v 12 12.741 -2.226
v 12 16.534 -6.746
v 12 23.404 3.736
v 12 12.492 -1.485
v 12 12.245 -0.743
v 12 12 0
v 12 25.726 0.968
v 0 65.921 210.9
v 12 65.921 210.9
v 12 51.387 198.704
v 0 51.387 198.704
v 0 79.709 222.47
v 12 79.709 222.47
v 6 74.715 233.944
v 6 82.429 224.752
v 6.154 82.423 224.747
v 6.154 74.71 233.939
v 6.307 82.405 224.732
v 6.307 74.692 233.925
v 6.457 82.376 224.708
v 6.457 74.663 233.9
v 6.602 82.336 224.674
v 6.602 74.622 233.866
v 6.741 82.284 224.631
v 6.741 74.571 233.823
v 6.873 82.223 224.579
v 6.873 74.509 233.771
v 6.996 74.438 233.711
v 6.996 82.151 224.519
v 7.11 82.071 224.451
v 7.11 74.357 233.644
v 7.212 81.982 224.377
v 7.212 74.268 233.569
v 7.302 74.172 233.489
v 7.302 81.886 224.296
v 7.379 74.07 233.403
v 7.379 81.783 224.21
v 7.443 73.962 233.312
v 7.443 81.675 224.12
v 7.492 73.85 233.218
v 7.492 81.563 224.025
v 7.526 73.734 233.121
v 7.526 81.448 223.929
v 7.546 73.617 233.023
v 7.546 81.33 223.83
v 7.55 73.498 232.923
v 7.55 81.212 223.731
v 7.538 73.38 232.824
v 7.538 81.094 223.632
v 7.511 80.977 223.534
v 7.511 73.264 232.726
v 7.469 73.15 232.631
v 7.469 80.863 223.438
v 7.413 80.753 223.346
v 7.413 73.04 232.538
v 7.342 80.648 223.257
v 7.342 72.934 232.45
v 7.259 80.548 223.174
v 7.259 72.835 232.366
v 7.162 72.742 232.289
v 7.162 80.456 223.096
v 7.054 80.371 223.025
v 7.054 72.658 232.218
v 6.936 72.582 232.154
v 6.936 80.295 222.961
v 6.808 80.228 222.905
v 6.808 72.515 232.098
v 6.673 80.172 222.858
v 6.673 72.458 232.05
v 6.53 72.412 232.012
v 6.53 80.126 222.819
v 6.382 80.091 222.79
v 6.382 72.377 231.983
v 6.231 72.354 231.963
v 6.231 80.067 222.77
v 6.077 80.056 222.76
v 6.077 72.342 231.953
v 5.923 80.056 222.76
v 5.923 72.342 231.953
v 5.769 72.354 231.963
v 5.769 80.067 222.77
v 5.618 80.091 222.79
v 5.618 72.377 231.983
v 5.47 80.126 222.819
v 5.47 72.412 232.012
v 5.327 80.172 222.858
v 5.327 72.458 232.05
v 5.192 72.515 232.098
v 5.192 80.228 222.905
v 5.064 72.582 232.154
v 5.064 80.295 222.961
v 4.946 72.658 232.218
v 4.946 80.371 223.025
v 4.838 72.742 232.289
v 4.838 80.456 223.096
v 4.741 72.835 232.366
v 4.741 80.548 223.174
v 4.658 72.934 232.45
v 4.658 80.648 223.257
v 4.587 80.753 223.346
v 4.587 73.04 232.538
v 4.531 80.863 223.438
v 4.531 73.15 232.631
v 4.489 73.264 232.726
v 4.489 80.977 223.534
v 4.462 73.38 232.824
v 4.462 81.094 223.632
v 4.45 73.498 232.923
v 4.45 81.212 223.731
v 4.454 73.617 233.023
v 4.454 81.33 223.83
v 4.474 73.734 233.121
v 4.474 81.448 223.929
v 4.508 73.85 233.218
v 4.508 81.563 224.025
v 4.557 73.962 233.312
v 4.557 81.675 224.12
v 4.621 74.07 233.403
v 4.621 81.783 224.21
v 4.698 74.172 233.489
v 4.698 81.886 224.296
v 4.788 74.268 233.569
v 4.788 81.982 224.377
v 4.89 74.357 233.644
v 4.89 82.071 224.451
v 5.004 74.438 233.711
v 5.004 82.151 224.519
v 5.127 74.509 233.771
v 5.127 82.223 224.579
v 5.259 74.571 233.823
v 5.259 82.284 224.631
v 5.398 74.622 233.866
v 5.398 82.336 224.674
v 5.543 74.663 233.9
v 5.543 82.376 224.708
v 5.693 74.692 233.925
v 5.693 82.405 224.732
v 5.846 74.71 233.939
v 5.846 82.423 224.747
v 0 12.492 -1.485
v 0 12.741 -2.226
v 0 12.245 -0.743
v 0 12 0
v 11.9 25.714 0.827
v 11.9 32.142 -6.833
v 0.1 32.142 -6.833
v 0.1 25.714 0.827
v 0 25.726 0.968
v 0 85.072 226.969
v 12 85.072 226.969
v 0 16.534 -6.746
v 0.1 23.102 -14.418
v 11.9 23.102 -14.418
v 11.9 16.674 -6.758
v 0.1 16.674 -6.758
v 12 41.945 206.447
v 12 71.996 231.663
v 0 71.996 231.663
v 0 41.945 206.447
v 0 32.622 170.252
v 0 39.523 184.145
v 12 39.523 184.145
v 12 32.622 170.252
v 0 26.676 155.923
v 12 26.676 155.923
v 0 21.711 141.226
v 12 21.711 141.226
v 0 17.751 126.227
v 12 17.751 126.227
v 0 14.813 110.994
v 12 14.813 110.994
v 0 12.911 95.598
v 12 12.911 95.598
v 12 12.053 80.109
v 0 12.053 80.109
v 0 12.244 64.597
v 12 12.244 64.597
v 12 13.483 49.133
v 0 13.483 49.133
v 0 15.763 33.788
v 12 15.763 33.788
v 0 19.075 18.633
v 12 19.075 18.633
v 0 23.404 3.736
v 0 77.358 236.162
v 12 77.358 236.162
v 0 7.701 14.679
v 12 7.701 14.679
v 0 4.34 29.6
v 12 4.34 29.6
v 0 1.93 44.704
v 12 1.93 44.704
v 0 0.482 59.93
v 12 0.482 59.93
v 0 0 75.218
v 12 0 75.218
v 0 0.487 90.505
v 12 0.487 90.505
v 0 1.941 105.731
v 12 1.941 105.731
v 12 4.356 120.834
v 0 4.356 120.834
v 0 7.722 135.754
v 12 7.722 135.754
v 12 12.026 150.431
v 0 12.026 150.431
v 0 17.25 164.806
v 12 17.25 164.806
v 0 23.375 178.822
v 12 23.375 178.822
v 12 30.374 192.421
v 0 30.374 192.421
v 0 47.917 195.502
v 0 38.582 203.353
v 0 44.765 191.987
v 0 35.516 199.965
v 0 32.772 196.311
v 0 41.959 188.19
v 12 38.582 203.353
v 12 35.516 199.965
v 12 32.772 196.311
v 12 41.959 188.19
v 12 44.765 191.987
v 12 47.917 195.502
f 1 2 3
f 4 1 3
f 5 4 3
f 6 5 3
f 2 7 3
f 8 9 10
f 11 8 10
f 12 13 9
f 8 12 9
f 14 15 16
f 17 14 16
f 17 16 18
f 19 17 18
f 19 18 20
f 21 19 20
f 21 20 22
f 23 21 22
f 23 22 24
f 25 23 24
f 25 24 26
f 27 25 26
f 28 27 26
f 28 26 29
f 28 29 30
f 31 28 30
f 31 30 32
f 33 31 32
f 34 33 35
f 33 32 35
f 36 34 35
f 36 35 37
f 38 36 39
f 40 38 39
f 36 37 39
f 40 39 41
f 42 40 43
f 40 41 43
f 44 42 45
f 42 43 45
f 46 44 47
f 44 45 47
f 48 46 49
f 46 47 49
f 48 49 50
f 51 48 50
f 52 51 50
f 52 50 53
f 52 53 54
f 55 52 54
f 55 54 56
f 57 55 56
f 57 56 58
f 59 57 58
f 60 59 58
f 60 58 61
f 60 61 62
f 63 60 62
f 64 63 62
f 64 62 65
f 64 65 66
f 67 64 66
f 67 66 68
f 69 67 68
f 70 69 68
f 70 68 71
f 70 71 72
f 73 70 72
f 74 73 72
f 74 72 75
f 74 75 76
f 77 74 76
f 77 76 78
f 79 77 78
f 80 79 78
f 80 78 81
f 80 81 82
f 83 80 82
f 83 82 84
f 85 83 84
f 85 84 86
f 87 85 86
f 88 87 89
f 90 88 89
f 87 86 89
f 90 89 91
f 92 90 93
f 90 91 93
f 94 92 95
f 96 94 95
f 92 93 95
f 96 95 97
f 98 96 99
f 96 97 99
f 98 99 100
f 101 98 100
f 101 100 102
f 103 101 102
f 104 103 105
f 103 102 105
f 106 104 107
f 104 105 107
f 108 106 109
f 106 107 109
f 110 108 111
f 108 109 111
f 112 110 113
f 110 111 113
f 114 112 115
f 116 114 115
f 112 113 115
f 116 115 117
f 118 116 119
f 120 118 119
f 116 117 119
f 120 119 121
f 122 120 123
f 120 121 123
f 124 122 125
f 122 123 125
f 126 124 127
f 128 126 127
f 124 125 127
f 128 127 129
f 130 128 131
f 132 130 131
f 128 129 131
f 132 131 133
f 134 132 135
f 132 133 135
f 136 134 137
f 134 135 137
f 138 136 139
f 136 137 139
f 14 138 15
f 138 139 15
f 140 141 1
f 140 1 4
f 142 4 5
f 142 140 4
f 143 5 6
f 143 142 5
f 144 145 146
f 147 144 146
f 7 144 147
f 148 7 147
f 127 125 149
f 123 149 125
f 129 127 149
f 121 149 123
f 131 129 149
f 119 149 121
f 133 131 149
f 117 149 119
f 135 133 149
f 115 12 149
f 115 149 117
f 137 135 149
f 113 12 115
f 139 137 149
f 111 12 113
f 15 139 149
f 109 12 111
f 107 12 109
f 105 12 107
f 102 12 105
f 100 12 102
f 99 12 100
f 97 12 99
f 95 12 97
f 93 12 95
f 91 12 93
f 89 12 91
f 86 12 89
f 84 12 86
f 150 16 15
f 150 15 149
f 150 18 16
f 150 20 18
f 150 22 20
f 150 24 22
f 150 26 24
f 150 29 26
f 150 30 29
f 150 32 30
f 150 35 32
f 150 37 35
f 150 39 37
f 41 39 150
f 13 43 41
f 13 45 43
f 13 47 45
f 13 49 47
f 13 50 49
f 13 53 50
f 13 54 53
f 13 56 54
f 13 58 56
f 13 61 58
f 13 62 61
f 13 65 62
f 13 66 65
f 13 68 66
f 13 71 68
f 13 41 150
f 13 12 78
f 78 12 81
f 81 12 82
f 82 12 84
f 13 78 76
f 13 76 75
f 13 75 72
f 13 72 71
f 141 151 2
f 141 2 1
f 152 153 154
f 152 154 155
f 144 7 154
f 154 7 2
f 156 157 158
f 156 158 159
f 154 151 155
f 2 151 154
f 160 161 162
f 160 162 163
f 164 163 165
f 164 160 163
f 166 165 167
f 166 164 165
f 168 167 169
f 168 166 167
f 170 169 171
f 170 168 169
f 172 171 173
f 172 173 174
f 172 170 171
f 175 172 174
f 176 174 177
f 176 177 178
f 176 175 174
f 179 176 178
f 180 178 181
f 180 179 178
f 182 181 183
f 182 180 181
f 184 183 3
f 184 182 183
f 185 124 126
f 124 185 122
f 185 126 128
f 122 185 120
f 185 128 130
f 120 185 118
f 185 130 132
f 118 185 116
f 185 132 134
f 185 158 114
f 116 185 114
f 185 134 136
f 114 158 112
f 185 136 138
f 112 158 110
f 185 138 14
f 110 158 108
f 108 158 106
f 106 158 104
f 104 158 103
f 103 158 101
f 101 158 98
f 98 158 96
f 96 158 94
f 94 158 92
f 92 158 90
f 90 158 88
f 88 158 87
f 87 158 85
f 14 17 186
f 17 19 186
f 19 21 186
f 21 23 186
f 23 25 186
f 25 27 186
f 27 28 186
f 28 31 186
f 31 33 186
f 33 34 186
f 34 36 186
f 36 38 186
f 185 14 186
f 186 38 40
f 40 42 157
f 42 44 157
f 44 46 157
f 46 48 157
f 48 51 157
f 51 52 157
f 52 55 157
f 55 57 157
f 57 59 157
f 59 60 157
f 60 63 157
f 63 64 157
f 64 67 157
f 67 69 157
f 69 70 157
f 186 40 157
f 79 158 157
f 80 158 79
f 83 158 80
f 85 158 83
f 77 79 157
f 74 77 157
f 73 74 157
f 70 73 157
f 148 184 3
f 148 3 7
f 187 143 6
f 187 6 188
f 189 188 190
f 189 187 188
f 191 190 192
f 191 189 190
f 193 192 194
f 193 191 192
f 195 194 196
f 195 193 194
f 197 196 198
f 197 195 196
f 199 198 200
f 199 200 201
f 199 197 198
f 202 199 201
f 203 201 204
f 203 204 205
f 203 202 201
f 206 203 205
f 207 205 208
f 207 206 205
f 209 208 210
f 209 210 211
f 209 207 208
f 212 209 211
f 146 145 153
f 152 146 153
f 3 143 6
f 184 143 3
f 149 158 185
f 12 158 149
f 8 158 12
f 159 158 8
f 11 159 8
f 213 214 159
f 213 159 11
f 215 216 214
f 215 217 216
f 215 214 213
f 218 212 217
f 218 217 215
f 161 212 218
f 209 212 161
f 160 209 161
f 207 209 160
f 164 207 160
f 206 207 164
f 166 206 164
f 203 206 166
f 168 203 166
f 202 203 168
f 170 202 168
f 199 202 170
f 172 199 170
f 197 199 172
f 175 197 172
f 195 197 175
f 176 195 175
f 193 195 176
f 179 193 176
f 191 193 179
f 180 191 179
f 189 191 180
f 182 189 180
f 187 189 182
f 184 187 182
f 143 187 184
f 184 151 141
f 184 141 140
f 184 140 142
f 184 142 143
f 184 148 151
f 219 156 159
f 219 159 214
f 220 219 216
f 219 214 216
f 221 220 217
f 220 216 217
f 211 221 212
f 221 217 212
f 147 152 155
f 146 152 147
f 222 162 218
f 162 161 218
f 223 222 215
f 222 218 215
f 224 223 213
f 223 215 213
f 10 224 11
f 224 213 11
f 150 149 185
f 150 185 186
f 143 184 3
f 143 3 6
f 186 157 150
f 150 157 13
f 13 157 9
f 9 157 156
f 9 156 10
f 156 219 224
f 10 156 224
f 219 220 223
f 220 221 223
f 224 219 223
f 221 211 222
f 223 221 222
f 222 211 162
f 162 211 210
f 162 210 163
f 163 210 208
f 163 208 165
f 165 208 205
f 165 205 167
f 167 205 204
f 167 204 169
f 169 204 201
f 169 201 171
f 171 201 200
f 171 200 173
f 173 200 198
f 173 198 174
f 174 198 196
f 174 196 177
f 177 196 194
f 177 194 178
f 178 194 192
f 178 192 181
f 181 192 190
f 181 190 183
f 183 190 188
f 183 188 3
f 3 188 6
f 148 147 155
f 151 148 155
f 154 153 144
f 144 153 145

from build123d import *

# Parameters (mm, degrees)
AUFSATZ_LINEAR_AUSTRAGEN1_DEPTH = 12
AUFSATZ_LINEAR_AUSTRAGEN3_DEPTH = 12
AUFSATZ_LINEAR_AUSTRAGEN4_DEPTH = 12
SCHNITT_LINEAR_AUSTRAGEN1_DEPTH = 254.175024926
VERRUNDUNG1_R                   = 50
SKIZZE9_W                       = 12
SKIZZE9_H                       = 12
AUFSATZ_LINEAR_AUSTRAGEN6_DEPTH = 7
SKIZZE10_R                      = 9.036348878
SKIZZE10_W                      = 11.8
SKIZZE10_H                      = 11.8
SCHNITT_LINEAR_AUSTRAGEN3_DEPTH = 10
SKIZZE11_R                      = 1.55
SCHNITT_LINEAR_AUSTRAGEN4_DEPTH = 218.416419828
FASE1_SIZE                      = 0.1


with BuildPart() as part:
    # Skizze1 → Aufsatz-Linear austragen1 (new body)
    with BuildSketch(Plane(origin=(0, 0, 0), x_dir=(0, 0, -1), z_dir=(1, 0, 0))):
        with BuildLine():
            Line((-240, 65), (-230.735708163, 72.773663864))
            ThreePointArc((-230.735708163, 72.773663864), (-123.944567763, 17.242039243), (-3.735818811, 23.403668612))
            Line((-3.735818811, 23.403668612), (0, 12))
            ThreePointArc((0, 12), (-127.247502729, 5.681119716), (-240, 65))
        make_face()
    extrude(amount=AUFSATZ_LINEAR_AUSTRAGEN1_DEPTH)

    # Skizze5 → Aufsatz-Linear austragen4 (add)
    with BuildSketch(Plane(origin=(12, 0, 0), x_dir=(0, 0, -1), z_dir=(1, 0, 0))):
        Polygon((-231.662517154, 71.995978781), (-222.469983836, 79.709430098), (-210.899806862, 65.920630121), (-192.948331238, 44.526894555), (-220.092340179, 58.207178805), align=None)
    extrude(amount=-AUFSATZ_LINEAR_AUSTRAGEN4_DEPTH)

    # Skizze6 → Schnitt-Linear austragen1 (cut, through all)
    with BuildSketch(Plane(origin=(12, 0, 0), x_dir=(0, 0, -1), z_dir=(1, 0, 0))):
        Polygon((-231.662517154, 71.995978781), (-199.510648028, 33.678873242), (-204.367668784, 29.603348917), (-240, 65), align=None)
    extrude(amount=-SCHNITT_LINEAR_AUSTRAGEN1_DEPTH, mode=Mode.SUBTRACT)

    # Verrundung1
    verrundung1_edges = [part.edges().sort_by_distance(p)[0] for p in [
        (6, 44.526894555, 192.948331238),
        (6, 35.285406895, 200.858689823),
    ]]
    fillet(verrundung1_edges, radius=VERRUNDUNG1_R)

    # Skizze9 → Aufsatz-Linear austragen6 (add)
    with BuildSketch(Plane(origin=(0, 156.320496136, 131.168470653), x_dir=(1, 0, 0), z_dir=(0, 0.7660444431189836, 0.6427876096865328))):
        with Locations((6, -125.185660837)):
            Rectangle(SKIZZE9_W, SKIZZE9_H)
    extrude(amount=AUFSATZ_LINEAR_AUSTRAGEN6_DEPTH)

    # Skizze11 → Schnitt-Linear austragen4 (cut, through all)
    with BuildSketch(Plane(origin=(0, -76.611066038, 91.301513183), x_dir=(-1, 0, 0), z_dir=(0, 0.6427876096865329, -0.7660444431189836))):
        with Locations(Location((-6, 206.061915128, 0), (0, 0, 90))):
            Circle(SKIZZE11_R)
    extrude(amount=-SCHNITT_LINEAR_AUSTRAGEN4_DEPTH, mode=Mode.SUBTRACT)


with BuildPart() as body_2:
    # Skizze4 → Aufsatz-Linear austragen3 (new body)
    with BuildSketch(Plane(origin=(0, 0, 0), x_dir=(0, 0, -1), z_dir=(1, 0, 0))):
        with BuildLine():
            Line((-3.735818811, 23.403668612), (6.769031275, 32.218284445))
            Line((6.769031275, 32.218284445), (14.482482591, 23.025751128))
            Line((14.482482591, 23.025751128), (2.225771501, 12.741149373))
            ThreePointArc((2.225771501, 12.741149373), (1.113785782, 12.367871772), (0, 12))
            Line((0, 12), (-3.735818811, 23.403668612))
        make_face()
    extrude(amount=AUFSATZ_LINEAR_AUSTRAGEN3_DEPTH)

    # Skizze10 → Schnitt-Linear austragen3 (cut)
    with BuildSketch(Plane(origin=(0, 16.644916272, -19.836638765), x_dir=(-1, 0, 0), z_dir=(0, 0.6427876096865353, -0.7660444431189815))):
        with Locations((-6, 14.329588333)):
            Circle(SKIZZE10_R)
        with Locations((-6, 14.329588333)):
            Rectangle(SKIZZE10_W, SKIZZE10_H, mode=Mode.SUBTRACT)
    extrude(amount=-SCHNITT_LINEAR_AUSTRAGEN3_DEPTH, mode=Mode.SUBTRACT)

    # Fase1
    fase1_edges = [body_2.edges().sort_by_distance(p)[0] for p in [
        (0, 21.194141689, -2.965312502),
        (6, 16.597875031, -6.82203816),
        (6, 25.790408348, 0.891413156),
        (12, 21.194141689, -2.965312502),
    ]]
    chamfer(fase1_edges, length=FASE1_SIZE - 0.0001)  # a hair under: the kernel refuses the full size


solid = Compound([part.part, body_2.part])
